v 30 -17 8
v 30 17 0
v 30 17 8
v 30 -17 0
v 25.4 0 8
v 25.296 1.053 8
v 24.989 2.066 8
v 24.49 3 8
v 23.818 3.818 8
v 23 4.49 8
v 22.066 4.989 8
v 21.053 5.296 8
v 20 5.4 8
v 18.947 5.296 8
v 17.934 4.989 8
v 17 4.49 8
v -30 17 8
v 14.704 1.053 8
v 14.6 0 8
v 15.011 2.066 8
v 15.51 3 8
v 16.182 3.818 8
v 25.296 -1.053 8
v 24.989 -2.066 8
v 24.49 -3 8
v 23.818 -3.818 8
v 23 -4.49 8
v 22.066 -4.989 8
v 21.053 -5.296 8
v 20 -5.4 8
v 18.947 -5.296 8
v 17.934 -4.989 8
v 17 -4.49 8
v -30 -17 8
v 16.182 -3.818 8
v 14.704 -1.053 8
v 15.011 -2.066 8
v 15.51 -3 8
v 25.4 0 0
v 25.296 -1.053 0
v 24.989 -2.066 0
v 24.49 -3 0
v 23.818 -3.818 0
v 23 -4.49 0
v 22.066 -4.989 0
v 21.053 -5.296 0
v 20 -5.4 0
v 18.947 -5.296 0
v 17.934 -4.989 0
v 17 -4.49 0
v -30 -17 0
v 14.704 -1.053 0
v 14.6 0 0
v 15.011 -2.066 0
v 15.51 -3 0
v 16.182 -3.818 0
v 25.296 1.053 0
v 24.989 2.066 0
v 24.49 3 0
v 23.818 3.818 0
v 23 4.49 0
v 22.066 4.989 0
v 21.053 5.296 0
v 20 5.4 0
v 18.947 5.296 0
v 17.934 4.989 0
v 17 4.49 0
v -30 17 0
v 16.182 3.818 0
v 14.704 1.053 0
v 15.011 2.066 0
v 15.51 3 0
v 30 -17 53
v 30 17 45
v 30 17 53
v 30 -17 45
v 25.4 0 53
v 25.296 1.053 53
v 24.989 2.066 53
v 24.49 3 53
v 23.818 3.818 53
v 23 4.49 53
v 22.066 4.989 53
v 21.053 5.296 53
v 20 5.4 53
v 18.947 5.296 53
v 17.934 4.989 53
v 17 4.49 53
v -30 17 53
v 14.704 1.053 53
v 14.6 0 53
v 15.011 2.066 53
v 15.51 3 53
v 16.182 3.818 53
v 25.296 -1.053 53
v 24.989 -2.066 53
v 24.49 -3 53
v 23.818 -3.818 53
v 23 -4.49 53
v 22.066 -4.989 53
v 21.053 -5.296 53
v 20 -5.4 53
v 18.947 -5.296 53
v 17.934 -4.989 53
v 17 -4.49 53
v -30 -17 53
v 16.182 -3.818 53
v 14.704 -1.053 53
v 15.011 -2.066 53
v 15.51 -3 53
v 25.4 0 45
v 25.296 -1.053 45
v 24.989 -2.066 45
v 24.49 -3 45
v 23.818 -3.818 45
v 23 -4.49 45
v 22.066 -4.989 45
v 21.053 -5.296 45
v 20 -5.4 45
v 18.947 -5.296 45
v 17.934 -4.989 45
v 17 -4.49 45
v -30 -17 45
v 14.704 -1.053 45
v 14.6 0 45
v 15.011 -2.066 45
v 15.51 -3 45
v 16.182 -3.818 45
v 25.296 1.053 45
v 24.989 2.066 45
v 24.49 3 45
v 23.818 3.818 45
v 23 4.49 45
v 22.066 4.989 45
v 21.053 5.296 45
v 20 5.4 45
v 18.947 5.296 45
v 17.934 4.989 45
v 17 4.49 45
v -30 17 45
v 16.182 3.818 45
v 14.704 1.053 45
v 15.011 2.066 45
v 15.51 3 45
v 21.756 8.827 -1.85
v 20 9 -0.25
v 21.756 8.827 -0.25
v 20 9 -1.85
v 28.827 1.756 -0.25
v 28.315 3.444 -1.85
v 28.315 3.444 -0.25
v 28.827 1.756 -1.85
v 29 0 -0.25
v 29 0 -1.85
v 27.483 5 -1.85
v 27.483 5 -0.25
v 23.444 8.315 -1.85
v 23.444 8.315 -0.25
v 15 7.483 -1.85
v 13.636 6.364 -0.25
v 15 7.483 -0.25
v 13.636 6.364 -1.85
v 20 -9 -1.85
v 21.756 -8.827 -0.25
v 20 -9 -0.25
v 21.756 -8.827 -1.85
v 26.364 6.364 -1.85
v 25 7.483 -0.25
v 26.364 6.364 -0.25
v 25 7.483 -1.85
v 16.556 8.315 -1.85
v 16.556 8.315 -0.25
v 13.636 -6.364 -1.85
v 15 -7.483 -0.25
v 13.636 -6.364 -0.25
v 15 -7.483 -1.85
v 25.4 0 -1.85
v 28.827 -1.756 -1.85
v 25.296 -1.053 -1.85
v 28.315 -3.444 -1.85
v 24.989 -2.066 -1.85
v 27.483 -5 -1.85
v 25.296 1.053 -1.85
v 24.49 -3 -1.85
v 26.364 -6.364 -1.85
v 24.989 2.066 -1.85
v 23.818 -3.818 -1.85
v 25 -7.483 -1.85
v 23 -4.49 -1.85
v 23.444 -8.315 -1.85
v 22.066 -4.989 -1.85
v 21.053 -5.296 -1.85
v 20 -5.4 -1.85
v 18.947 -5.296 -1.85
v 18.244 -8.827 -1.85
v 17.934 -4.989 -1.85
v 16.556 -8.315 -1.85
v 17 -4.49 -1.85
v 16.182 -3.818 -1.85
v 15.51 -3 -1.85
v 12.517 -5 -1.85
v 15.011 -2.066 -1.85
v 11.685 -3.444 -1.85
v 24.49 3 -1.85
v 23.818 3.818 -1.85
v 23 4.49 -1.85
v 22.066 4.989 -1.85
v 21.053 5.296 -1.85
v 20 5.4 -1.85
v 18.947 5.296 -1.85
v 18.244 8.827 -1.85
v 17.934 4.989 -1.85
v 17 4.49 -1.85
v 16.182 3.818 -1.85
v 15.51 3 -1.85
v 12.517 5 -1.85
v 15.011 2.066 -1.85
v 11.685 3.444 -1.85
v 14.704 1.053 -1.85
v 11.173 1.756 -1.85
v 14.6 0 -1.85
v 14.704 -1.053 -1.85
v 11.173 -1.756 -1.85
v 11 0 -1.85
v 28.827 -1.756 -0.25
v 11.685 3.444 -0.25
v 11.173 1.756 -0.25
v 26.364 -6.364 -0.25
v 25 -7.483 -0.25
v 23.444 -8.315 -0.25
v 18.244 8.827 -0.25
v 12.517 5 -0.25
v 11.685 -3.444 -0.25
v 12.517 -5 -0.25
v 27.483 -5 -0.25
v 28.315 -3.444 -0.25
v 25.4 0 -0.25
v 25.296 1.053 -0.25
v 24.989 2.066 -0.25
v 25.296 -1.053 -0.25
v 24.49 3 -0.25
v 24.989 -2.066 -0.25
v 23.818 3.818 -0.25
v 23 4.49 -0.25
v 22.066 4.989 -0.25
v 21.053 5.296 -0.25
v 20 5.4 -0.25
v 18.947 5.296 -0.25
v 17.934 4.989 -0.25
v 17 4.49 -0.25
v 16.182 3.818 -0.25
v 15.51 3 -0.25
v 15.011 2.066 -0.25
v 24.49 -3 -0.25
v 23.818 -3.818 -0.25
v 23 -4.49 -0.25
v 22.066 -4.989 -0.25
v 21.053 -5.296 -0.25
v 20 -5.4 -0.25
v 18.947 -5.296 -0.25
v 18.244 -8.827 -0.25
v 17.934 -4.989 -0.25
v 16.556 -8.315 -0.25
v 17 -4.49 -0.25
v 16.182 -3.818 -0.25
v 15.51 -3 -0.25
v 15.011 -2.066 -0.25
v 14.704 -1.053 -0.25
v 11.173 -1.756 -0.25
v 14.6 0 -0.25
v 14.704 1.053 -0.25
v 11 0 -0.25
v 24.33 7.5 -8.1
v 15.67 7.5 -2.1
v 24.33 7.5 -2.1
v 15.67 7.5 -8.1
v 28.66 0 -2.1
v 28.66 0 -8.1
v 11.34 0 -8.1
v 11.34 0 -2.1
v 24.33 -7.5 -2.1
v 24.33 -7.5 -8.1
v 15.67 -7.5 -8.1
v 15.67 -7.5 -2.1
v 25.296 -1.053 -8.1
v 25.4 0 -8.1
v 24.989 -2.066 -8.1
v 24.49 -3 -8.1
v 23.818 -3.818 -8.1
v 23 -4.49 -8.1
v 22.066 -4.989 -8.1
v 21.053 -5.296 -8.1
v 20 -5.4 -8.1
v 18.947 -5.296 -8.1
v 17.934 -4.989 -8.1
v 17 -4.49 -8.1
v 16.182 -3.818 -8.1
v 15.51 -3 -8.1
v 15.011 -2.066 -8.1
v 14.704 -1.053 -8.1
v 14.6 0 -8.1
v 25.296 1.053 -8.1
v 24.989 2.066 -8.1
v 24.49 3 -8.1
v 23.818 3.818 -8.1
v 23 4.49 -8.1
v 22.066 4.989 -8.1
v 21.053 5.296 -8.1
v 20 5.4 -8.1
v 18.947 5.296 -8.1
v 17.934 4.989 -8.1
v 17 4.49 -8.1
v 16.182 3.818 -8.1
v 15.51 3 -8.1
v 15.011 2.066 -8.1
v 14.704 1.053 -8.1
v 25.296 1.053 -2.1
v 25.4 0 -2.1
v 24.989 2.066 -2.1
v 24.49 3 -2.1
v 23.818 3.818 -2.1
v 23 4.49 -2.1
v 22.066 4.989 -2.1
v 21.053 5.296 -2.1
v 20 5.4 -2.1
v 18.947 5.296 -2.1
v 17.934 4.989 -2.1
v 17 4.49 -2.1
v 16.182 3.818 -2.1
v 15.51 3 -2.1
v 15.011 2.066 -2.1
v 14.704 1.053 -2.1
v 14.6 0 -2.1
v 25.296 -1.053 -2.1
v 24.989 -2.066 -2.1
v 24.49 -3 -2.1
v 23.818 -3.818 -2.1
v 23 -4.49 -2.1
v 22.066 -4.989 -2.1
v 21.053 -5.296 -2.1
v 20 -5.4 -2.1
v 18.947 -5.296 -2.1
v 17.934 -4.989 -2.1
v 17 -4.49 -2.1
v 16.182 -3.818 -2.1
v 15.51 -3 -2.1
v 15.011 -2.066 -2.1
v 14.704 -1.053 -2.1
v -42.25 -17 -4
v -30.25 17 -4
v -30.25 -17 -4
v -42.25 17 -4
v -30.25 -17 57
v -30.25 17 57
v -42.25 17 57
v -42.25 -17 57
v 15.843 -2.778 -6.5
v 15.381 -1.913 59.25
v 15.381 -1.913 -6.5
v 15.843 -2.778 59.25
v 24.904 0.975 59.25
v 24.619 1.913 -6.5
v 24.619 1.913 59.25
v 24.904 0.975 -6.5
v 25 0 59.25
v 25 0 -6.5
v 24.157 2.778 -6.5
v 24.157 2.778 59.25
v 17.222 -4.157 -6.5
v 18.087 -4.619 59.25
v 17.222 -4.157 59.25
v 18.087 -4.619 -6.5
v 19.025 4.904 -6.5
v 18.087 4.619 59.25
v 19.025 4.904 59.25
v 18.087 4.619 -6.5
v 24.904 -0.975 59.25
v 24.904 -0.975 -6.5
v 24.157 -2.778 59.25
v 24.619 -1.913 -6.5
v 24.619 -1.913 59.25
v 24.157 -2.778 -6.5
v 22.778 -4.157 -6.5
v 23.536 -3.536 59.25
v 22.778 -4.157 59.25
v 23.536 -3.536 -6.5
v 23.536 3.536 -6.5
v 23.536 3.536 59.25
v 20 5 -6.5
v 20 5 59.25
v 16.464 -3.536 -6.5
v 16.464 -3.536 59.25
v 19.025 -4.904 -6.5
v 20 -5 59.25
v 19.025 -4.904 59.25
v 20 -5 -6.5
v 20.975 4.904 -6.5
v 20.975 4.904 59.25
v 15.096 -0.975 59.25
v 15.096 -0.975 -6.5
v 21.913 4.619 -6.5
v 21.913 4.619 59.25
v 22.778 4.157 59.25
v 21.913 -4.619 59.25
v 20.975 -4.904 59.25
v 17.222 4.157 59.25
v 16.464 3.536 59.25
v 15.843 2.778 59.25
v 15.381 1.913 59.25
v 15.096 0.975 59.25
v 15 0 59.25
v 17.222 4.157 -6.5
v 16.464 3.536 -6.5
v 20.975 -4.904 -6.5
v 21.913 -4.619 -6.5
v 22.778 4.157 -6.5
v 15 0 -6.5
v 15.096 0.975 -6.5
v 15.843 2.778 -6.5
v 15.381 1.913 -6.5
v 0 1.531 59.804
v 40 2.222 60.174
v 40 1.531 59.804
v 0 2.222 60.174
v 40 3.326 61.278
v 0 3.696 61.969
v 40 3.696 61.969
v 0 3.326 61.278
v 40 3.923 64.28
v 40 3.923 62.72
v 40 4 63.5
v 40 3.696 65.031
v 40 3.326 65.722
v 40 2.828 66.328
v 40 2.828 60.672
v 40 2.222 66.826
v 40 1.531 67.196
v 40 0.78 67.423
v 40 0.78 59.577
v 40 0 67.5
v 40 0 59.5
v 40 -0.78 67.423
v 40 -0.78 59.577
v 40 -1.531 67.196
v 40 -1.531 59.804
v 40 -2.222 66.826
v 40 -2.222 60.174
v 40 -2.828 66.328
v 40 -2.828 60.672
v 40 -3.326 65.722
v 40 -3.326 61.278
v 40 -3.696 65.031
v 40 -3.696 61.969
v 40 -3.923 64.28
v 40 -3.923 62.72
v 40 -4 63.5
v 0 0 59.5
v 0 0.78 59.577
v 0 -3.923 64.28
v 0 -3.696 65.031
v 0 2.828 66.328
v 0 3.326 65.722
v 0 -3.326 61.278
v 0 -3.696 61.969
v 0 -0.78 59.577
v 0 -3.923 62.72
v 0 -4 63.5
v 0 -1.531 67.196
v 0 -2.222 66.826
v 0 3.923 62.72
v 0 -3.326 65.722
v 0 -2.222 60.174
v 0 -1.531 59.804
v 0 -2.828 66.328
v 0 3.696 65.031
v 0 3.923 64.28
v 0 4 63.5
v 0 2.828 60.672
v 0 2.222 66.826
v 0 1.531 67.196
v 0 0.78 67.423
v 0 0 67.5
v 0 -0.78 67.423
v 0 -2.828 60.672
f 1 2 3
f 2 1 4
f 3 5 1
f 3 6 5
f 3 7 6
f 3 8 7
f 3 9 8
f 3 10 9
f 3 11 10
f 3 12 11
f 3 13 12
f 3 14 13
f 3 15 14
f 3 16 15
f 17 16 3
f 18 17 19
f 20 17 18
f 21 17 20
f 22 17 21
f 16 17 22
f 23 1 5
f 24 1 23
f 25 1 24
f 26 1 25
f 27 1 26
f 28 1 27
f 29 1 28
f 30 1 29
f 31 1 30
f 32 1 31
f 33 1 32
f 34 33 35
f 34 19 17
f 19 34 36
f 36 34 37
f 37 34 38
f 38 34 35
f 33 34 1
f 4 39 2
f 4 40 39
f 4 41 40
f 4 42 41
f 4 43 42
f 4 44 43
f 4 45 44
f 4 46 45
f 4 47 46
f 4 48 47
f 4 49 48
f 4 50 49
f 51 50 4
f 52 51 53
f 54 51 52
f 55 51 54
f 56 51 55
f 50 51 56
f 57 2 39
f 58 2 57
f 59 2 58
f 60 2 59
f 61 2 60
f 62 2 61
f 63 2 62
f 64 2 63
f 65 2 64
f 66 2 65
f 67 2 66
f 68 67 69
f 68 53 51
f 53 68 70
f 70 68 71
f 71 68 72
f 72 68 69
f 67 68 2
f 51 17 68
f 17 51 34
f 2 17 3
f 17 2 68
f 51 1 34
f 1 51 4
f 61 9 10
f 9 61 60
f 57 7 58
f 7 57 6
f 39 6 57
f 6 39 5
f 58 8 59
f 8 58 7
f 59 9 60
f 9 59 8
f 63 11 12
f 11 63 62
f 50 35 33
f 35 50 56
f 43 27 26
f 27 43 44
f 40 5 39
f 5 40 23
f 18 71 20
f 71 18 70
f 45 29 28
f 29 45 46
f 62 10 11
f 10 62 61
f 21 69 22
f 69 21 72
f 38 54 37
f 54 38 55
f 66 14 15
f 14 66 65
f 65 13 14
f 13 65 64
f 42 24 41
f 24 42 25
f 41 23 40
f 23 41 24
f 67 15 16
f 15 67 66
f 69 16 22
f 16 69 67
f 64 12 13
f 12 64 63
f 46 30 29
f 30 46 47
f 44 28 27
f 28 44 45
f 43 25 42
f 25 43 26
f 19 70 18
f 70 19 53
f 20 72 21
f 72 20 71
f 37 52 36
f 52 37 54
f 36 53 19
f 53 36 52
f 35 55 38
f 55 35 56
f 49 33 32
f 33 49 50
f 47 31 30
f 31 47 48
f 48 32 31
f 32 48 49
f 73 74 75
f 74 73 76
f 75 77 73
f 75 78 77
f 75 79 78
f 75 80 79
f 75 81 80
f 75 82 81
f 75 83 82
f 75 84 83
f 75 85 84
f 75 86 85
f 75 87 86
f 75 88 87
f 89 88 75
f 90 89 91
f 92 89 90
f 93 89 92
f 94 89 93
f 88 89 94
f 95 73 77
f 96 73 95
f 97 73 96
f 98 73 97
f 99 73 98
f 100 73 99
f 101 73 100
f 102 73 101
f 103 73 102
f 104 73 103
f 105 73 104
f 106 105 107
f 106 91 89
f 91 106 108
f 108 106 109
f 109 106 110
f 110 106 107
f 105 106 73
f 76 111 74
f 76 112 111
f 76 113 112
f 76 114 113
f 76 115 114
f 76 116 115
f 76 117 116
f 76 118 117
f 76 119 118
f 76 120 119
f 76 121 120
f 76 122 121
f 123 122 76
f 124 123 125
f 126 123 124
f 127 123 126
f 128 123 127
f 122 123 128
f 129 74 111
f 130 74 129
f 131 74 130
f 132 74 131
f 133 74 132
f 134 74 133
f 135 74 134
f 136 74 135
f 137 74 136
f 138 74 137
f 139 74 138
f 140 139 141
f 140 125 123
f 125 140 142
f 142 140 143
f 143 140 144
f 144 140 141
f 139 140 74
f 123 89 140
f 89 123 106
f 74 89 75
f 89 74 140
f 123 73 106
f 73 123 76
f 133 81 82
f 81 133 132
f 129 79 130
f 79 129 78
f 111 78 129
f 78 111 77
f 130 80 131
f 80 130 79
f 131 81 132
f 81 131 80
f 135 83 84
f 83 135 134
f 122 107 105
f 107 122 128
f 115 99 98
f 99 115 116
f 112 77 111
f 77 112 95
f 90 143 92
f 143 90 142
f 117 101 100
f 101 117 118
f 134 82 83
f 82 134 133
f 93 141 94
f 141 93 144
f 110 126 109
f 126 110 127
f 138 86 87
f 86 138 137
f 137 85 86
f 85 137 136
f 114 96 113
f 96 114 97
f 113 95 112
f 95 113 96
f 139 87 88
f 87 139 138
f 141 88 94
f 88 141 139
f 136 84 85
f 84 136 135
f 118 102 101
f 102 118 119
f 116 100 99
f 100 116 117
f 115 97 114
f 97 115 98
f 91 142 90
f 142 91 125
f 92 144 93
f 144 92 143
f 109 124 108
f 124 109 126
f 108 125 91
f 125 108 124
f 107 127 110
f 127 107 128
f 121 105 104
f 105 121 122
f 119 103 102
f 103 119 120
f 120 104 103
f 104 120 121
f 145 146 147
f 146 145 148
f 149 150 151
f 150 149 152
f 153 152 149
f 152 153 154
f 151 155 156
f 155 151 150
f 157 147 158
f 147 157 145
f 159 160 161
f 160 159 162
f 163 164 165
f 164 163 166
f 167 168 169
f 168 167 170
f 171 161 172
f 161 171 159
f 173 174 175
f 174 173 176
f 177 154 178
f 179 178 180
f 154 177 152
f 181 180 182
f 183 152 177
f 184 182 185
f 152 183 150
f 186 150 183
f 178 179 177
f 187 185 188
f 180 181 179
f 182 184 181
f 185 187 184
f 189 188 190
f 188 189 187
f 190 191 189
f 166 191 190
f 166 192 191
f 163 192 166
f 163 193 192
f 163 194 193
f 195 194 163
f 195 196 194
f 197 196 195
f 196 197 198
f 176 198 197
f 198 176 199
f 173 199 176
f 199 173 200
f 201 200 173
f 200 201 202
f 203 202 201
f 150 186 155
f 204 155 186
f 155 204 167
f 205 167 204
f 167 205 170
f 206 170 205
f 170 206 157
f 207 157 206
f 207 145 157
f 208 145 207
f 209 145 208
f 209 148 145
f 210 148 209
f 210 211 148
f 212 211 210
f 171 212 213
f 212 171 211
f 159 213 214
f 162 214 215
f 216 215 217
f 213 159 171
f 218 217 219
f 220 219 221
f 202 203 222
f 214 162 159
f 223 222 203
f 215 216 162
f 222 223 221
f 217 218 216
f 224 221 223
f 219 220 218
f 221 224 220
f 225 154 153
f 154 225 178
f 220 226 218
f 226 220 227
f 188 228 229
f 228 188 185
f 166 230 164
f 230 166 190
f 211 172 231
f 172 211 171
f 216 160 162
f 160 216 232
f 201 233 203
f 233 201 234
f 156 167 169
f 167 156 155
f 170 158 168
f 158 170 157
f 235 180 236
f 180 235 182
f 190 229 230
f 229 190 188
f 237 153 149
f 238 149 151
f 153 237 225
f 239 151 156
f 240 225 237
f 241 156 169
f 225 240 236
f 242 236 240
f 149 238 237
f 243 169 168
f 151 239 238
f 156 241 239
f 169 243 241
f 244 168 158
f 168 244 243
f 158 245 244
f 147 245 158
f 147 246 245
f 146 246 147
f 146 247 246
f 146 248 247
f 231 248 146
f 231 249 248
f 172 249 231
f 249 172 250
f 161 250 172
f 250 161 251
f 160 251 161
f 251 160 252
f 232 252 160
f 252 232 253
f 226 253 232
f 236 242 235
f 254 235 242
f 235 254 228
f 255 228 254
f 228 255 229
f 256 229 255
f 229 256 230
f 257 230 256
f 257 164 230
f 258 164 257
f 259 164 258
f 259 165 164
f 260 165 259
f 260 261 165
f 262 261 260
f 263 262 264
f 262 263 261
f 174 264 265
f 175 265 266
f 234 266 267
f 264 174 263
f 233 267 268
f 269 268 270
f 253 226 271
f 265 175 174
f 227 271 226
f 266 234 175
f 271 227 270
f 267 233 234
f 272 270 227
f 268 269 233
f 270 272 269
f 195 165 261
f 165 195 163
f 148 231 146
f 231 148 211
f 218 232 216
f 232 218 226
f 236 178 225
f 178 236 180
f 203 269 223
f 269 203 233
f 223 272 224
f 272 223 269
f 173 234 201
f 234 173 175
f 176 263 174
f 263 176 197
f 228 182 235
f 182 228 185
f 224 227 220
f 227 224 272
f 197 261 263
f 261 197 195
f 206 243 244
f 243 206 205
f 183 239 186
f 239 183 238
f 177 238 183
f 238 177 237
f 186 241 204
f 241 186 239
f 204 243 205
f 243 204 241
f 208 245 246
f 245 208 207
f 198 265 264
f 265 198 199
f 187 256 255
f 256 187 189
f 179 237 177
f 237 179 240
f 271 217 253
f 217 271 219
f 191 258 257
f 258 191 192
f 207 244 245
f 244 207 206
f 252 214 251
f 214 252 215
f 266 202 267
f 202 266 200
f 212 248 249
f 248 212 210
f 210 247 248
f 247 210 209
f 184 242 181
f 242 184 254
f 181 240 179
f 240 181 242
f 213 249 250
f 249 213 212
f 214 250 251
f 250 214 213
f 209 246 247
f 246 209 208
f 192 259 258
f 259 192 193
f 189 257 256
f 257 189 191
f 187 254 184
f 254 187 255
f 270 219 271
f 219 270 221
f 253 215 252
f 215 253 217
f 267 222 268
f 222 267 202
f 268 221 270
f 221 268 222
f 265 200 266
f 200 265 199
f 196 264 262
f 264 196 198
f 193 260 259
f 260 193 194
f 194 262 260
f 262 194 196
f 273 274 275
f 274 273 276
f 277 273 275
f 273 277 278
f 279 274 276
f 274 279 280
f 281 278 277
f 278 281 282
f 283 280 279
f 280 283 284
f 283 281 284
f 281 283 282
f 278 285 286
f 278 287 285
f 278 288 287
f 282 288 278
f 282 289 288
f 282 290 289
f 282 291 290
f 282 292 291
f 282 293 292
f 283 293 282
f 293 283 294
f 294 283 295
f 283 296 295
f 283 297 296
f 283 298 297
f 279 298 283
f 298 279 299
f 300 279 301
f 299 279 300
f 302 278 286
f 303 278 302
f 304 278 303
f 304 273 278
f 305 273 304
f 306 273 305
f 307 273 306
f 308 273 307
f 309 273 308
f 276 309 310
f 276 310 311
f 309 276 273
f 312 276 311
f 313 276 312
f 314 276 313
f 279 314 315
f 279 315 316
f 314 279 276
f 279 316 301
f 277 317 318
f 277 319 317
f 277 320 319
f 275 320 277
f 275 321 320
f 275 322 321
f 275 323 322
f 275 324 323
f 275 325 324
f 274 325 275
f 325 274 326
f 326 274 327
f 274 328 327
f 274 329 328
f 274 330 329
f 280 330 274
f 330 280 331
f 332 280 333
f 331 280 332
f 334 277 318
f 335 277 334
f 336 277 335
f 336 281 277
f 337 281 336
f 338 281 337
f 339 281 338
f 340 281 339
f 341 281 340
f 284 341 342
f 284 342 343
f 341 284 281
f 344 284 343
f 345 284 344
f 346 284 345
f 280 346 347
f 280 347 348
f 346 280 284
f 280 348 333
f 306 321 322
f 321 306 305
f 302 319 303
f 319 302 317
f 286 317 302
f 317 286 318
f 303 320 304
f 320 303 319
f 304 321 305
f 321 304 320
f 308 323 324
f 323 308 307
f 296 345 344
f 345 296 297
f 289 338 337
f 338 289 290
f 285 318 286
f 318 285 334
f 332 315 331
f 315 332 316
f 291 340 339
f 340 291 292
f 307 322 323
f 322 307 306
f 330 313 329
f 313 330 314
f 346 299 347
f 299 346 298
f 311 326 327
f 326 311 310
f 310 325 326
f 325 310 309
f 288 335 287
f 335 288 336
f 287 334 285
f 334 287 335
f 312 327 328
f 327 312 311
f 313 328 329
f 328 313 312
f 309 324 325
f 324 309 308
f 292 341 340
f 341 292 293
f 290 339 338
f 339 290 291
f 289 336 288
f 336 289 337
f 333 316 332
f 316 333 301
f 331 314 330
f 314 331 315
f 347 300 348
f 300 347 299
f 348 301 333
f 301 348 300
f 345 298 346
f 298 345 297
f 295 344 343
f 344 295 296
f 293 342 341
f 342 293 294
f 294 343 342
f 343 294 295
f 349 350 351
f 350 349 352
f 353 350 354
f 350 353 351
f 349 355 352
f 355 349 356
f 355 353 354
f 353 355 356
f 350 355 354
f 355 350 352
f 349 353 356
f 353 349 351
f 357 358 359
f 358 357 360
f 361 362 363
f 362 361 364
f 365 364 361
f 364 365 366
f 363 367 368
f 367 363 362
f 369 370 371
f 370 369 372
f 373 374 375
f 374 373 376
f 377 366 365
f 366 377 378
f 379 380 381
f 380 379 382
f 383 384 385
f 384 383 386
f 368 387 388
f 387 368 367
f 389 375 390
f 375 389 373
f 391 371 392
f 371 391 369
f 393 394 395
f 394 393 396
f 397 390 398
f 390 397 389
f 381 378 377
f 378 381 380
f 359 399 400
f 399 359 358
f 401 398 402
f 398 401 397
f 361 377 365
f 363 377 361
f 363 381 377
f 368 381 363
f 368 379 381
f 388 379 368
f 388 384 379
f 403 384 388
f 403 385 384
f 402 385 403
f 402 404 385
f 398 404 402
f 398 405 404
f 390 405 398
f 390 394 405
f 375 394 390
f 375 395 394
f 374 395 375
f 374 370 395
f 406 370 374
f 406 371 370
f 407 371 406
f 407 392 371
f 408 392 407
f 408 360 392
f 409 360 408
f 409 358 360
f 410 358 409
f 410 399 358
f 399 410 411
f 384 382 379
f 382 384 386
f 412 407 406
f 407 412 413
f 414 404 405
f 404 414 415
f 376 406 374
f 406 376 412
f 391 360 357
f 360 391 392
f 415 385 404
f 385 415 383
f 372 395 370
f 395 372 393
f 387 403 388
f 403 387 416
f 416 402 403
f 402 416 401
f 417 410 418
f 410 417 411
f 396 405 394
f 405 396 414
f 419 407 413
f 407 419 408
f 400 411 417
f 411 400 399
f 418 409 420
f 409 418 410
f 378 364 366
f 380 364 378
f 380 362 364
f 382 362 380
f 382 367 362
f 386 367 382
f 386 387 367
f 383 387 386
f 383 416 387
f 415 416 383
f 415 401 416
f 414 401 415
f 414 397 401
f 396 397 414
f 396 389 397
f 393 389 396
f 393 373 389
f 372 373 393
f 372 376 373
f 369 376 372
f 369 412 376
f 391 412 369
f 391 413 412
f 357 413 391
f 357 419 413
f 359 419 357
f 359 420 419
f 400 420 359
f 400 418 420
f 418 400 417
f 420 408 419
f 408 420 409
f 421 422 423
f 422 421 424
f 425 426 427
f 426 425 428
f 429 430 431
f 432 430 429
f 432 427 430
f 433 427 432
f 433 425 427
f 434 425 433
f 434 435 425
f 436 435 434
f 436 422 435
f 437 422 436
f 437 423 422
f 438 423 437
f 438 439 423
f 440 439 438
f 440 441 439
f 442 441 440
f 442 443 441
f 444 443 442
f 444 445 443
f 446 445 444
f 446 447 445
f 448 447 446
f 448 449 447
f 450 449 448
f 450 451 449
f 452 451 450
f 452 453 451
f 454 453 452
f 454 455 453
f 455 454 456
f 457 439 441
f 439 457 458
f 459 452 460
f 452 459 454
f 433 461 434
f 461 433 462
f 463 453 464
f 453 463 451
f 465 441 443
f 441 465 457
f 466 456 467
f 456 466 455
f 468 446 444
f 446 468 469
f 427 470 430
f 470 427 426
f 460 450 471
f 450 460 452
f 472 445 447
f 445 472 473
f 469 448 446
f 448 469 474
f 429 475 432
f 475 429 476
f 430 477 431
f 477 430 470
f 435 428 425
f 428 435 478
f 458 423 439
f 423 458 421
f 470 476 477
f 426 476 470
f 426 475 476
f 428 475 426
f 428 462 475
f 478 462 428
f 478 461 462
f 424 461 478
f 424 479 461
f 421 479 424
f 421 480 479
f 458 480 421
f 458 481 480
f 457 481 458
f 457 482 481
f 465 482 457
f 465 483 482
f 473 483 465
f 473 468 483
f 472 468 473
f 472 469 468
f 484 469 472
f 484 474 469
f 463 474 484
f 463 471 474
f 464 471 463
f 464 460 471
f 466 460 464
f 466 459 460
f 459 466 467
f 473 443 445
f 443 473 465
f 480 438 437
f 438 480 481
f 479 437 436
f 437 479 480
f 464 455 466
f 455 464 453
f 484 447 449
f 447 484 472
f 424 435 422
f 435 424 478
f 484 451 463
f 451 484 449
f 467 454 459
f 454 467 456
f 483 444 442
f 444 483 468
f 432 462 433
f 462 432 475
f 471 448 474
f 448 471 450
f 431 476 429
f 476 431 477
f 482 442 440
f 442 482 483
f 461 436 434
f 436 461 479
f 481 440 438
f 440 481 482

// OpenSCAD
$fn = 32;

// ------------------------------------------------------------------------
// C clamp: throat 45 mm, screw d10
// Every part is its own module, assembly() places every instance.
// ------------------------------------------------------------------------

// --- part 1 ---
module clamp_arm() {
  difference() {
    translate([-30, -17, 0]) cube([60, 34, 8]);
    translate([20, 0, -1]) cylinder(h = 10, d = 10.8);
  }
}

// --- part 2 ---
module clamp_spine() {
  difference() {
    translate([-30.5, -17, 0]) cube([61, 34, 12]);
  }
}

// --- part 3 ---
module clamp_screw() {
  translate([0, 0, -32.875]) cylinder(h = 65.75, d = 10);
}

// --- part 4 ---
module clamp_washer() {
  difference() {
      translate([0, 0, 0]) cylinder(h = 1.6, d = 18);
      translate([0, 0, -1]) cylinder(h = 3.6, d = 10.8);
    }
}

// --- part 5 ---
module clamp_nut() {
  difference() {
    linear_extrude(height = 6) polygon(points = [[8.66, 0], [4.33, 7.5], [-4.33, 7.5], [-8.66, 0], [-4.33, -7.5], [4.33, -7.5]]);
    translate([0, 0, -1]) cylinder(h = 8, d = 10.8);
  }
}

// --- part 6 ---
module tommy_bar() {
  translate([0, 0, -20]) cylinder(h = 40, d = 8);
}

// --- assembly ---
module assembly() {
  color([0.80, 0.24, 0.20]) translate([0, 0, 0]) rotate([0, 0, 0]) clamp_arm();
  color([0.20, 0.45, 0.75]) translate([0, 0, 45]) rotate([0, 0, 0]) clamp_arm();
  color([0.25, 0.62, 0.32]) translate([-42.25, 0, 26.5]) rotate([0, 90, 0]) clamp_spine();
  color([0.92, 0.70, 0.18]) translate([20, 0, 26.375]) rotate([0, 0, 0]) clamp_screw();
  color([0.58, 0.35, 0.70]) translate([20, 0, -1.85]) rotate([0, 0, 0]) clamp_washer();
  color([0.16, 0.66, 0.66]) translate([20, 0, -8.1]) rotate([0, 0, 0]) clamp_nut();
  color([0.85, 0.48, 0.18]) translate([20, 0, 63.5]) rotate([0, 90, 0]) tommy_bar();
}

assembly();
